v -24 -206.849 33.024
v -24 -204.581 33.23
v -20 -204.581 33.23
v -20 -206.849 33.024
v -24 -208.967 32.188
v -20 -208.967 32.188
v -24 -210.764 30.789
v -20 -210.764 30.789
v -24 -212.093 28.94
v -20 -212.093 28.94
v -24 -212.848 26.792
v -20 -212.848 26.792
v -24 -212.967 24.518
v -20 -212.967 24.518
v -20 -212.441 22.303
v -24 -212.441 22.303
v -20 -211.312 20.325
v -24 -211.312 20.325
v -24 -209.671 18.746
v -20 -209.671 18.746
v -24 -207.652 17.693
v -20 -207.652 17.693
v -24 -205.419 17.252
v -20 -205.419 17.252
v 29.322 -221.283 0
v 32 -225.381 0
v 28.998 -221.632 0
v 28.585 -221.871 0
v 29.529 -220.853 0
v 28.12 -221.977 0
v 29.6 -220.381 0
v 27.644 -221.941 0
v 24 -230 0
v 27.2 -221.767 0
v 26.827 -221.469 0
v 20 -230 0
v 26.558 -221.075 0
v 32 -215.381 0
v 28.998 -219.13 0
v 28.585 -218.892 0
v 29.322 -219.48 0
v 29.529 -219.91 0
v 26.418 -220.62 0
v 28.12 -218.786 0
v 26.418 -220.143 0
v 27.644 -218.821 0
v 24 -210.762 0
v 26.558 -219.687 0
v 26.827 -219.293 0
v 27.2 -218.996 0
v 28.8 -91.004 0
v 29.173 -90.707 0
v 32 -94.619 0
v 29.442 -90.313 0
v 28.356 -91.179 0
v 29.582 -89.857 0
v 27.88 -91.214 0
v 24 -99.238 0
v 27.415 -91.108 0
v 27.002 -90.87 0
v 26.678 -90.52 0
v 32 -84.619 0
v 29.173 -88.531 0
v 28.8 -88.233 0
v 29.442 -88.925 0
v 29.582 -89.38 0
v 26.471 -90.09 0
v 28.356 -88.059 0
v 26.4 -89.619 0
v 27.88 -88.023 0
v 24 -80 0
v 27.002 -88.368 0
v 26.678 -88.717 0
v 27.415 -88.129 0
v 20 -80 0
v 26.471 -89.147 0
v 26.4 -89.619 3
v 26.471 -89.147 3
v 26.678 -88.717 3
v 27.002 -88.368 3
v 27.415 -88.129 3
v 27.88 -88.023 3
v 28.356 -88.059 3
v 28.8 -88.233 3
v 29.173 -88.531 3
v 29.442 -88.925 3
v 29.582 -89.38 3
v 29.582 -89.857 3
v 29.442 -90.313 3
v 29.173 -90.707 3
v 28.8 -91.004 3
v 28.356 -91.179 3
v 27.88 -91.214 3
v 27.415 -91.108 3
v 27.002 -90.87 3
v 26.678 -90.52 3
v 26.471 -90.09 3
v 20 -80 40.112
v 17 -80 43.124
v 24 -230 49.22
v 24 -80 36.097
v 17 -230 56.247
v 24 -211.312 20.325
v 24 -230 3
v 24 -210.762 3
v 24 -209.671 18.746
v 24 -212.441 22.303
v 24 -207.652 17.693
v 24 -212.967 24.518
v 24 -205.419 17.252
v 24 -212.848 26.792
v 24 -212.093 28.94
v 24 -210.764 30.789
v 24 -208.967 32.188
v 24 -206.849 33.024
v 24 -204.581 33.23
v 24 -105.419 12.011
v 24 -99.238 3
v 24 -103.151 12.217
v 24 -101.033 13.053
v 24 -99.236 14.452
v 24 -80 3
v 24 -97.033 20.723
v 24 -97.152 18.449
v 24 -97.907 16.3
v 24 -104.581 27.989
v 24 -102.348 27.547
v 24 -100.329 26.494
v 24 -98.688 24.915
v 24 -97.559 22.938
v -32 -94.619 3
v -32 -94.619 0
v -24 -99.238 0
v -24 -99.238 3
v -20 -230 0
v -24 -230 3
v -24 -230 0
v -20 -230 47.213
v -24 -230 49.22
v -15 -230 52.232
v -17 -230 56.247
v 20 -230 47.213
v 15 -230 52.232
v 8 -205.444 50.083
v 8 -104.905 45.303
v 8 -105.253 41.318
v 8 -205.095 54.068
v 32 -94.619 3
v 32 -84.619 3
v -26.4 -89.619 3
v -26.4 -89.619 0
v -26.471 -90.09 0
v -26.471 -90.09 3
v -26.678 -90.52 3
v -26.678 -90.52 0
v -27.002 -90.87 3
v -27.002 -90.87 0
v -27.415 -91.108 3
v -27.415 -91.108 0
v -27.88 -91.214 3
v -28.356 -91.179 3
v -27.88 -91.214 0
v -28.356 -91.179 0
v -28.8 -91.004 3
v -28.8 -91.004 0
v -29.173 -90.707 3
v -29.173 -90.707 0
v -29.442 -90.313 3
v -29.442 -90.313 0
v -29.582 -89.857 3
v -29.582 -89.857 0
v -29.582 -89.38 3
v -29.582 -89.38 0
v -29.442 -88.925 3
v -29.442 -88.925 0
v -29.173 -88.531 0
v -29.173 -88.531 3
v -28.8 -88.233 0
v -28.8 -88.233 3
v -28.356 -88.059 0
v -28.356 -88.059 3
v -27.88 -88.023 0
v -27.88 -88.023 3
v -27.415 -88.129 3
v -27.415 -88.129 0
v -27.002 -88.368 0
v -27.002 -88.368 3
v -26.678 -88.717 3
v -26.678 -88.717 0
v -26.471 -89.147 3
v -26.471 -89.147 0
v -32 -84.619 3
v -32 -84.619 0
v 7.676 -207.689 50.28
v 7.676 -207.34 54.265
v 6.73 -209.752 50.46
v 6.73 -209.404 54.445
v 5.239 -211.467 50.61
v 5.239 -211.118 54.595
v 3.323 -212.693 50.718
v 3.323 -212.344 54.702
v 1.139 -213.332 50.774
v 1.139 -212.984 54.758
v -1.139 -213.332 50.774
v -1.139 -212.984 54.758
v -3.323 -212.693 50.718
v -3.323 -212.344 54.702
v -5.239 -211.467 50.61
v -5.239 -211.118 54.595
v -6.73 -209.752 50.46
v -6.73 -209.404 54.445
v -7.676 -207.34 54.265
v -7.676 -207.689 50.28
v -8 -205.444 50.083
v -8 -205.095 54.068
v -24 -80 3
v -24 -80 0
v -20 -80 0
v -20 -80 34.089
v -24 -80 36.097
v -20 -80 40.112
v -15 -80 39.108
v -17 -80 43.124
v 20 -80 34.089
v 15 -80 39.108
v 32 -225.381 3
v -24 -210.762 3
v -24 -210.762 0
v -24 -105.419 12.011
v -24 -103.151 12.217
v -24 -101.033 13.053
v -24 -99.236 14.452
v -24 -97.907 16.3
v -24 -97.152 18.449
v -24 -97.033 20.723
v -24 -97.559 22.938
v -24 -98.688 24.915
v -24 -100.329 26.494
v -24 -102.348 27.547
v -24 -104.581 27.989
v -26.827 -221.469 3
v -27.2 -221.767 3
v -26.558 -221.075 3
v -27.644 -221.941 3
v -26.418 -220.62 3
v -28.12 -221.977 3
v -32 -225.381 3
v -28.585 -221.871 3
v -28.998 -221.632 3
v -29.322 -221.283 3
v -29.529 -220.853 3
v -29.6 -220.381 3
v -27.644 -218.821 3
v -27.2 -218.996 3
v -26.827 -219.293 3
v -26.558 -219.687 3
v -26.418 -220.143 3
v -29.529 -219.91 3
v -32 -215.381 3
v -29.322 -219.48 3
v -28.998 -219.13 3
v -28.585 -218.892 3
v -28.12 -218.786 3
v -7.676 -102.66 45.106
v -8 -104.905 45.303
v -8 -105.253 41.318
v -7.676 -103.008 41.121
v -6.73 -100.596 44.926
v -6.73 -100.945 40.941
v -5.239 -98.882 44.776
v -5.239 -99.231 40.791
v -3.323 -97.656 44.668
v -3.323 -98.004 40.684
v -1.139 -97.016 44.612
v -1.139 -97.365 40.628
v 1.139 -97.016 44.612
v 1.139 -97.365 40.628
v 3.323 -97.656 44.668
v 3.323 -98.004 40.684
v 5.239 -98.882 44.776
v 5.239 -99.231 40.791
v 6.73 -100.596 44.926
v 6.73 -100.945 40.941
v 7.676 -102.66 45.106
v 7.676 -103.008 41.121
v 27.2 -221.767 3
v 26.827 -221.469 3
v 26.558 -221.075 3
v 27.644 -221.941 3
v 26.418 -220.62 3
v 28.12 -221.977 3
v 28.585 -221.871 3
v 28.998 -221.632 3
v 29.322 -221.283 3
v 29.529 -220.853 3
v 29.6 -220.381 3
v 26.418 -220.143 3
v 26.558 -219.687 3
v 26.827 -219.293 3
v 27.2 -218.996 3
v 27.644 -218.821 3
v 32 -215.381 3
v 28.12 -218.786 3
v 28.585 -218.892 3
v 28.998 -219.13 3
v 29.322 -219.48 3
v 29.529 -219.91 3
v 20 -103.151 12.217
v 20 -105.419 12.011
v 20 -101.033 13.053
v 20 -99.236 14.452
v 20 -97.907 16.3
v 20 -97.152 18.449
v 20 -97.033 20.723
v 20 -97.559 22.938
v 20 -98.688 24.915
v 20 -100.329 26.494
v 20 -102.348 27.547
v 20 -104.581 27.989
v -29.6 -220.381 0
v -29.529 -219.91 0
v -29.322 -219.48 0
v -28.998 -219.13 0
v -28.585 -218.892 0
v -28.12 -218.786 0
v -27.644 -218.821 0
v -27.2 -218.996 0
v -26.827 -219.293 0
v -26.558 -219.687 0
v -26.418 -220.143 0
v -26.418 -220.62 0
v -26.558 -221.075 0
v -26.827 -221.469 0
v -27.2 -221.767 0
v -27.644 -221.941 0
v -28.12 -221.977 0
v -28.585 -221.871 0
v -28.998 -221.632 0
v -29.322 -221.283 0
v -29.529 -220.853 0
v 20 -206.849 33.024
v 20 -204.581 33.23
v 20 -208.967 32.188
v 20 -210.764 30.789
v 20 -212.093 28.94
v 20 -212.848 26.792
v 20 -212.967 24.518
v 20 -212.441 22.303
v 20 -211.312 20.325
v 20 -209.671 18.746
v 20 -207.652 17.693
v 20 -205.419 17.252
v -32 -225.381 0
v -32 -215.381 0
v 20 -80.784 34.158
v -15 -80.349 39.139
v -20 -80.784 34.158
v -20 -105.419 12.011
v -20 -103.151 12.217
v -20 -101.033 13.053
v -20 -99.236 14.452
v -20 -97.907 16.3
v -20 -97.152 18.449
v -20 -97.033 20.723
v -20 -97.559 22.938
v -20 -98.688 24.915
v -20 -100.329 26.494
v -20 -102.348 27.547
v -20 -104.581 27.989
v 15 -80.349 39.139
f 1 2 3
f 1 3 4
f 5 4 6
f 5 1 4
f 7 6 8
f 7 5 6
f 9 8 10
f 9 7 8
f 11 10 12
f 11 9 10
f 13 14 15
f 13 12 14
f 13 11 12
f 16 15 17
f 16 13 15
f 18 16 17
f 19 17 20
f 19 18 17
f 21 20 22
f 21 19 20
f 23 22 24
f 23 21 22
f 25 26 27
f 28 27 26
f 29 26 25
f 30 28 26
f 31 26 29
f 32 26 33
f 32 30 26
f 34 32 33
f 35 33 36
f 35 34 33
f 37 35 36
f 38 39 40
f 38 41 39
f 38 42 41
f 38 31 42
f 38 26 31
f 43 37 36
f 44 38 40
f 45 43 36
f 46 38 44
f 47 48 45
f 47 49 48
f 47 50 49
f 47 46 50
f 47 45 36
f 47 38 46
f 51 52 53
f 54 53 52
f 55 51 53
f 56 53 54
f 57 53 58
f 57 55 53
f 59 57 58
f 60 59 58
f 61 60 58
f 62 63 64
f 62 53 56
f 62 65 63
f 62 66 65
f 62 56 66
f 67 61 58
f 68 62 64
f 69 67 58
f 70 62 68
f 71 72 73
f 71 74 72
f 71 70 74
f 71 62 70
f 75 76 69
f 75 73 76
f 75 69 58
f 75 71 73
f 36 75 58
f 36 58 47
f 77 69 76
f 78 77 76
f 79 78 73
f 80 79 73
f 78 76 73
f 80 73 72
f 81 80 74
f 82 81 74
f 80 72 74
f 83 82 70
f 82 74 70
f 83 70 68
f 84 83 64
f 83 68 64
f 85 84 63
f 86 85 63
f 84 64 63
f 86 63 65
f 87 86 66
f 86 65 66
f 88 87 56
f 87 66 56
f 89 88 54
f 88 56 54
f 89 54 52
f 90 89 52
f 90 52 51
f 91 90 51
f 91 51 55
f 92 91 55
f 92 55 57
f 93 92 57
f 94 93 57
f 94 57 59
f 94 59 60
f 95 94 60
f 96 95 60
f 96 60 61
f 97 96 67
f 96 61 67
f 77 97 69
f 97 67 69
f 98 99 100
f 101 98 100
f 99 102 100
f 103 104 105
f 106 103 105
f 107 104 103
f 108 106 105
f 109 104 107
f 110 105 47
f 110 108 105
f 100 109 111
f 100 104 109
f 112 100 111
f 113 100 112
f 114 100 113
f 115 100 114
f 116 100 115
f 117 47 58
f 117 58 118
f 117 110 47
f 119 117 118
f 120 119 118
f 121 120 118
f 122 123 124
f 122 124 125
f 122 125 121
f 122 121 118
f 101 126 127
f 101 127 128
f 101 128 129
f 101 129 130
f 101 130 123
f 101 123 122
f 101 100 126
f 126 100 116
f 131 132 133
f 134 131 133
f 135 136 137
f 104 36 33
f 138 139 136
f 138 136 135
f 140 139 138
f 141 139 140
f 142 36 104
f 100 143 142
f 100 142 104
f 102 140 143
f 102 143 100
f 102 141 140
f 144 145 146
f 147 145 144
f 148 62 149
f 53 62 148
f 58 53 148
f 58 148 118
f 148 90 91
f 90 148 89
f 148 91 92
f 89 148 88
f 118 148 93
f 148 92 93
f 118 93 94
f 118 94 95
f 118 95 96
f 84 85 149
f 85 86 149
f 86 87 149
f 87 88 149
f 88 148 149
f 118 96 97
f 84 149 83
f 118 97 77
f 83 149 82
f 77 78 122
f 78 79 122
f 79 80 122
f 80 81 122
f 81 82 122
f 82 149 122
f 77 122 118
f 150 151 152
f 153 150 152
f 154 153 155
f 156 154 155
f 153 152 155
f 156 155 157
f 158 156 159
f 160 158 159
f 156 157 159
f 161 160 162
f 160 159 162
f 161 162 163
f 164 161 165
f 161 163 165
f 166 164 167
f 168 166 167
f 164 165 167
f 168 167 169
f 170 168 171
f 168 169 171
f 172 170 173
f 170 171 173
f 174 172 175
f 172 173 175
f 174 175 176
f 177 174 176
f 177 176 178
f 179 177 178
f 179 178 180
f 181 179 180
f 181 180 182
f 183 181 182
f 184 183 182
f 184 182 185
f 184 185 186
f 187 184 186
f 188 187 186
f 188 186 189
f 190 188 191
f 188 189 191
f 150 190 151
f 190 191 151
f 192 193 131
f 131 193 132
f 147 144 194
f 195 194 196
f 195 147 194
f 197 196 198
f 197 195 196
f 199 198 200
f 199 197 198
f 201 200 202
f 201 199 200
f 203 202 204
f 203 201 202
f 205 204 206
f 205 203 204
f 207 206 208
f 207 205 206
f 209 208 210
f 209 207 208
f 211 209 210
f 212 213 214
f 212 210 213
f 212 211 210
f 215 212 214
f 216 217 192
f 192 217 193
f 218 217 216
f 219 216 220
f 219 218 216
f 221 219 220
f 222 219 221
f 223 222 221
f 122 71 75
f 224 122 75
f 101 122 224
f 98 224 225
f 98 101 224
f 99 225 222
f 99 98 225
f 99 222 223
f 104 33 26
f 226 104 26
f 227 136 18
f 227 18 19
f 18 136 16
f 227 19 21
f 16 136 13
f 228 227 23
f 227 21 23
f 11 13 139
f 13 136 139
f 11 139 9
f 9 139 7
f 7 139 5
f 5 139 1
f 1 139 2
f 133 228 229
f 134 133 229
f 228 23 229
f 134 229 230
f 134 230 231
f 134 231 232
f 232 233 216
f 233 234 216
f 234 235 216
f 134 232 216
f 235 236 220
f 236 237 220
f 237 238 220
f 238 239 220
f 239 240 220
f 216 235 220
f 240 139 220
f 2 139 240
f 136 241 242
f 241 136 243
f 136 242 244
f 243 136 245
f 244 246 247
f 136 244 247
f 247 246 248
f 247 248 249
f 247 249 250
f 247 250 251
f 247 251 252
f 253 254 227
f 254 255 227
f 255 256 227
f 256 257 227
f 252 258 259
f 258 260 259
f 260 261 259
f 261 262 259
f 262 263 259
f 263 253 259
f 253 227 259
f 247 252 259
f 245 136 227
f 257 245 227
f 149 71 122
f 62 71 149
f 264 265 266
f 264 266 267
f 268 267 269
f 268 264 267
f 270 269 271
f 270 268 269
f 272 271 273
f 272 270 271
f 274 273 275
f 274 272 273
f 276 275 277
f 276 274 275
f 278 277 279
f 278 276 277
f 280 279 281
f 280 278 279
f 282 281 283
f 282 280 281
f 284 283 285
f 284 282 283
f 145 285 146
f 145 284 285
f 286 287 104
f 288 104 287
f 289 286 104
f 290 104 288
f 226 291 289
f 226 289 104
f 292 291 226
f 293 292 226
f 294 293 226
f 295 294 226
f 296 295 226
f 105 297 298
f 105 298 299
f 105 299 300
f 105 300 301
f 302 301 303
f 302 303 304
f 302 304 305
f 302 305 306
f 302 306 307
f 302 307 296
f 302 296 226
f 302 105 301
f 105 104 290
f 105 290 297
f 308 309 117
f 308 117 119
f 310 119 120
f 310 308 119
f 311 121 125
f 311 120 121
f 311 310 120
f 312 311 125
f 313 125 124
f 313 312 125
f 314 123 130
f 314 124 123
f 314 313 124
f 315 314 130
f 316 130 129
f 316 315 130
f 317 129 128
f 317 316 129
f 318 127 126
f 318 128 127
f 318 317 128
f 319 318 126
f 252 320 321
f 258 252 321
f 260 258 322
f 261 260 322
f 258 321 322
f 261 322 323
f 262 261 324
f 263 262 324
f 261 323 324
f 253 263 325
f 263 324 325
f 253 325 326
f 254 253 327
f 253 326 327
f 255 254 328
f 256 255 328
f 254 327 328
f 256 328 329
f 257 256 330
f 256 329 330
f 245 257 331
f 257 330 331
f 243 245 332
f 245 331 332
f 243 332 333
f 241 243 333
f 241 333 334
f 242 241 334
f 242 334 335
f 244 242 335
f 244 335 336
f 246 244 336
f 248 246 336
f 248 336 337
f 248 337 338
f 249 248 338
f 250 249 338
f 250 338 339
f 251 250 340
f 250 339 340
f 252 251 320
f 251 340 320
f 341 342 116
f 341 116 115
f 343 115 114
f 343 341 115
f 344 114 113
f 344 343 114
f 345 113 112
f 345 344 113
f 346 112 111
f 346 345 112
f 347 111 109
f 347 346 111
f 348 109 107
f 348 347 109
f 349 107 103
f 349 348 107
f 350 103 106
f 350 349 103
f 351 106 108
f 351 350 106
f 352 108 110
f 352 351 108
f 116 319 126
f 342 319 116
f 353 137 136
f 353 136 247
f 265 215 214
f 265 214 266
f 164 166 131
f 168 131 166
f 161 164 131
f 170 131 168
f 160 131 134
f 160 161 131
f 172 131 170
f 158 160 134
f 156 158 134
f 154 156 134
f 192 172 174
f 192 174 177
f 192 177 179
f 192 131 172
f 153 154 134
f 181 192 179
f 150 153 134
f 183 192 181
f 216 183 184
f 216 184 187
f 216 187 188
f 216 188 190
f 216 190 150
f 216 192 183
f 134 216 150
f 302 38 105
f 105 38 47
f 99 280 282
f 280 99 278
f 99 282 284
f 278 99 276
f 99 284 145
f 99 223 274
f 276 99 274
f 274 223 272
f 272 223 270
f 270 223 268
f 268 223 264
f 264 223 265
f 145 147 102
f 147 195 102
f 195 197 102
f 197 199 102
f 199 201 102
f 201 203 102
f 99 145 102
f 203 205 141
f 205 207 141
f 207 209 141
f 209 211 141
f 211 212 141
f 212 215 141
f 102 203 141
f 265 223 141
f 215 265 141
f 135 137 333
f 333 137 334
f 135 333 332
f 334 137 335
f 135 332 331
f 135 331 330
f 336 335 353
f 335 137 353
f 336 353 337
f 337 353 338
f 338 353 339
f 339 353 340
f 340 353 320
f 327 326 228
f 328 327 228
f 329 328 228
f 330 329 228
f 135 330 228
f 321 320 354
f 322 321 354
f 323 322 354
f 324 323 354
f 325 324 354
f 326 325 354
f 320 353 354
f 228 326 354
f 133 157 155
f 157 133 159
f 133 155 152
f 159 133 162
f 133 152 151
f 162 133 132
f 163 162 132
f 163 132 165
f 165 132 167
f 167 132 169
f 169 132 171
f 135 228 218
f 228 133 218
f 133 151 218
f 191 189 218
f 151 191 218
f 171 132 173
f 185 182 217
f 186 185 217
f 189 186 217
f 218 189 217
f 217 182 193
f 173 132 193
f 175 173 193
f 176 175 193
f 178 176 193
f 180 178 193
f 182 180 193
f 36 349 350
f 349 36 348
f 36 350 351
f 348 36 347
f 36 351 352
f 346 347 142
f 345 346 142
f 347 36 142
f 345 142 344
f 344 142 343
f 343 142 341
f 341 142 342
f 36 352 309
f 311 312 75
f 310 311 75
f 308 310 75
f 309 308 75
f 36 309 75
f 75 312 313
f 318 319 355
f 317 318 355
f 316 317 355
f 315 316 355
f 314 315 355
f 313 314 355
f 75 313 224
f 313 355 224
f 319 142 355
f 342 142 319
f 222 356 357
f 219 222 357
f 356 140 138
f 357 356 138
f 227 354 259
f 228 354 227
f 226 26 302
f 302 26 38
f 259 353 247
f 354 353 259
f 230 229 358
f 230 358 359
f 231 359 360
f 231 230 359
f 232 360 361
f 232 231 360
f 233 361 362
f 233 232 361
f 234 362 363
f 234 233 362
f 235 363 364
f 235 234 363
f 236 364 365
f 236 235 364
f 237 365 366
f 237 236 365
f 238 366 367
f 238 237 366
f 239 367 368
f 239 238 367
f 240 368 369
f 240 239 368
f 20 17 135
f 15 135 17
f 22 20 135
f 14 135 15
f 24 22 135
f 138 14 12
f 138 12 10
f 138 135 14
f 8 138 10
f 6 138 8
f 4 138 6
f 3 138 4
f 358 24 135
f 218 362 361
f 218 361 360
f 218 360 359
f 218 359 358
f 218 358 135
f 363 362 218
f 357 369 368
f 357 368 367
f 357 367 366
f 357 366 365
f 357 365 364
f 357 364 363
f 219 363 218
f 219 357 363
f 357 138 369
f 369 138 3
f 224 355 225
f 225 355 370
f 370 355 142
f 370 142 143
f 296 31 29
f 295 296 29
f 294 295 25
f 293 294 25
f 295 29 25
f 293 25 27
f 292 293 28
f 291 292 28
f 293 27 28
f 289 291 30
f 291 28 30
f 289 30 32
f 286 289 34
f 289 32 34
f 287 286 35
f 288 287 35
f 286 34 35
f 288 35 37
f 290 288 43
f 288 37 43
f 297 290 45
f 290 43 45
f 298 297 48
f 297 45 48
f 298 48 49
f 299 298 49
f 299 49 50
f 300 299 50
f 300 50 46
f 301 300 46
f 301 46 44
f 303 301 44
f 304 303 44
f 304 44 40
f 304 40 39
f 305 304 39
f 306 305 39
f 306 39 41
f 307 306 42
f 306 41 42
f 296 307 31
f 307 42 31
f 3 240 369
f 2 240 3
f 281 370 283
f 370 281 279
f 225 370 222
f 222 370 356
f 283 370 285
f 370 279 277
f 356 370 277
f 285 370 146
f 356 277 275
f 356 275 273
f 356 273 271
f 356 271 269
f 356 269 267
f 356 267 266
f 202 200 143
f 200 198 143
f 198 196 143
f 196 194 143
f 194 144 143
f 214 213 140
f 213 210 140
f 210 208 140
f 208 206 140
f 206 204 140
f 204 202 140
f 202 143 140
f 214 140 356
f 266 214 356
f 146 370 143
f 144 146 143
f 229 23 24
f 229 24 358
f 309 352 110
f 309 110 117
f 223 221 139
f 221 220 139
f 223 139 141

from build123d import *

# Parameters (mm, degrees)
BOSS_EXTRUDE1_START   = -24
BOSS_EXTRUDE1_DEPTH   = 4
BOSS_EXTRUDE1_START_2 = 20
BOSS_EXTRUDE1_2_DEPTH = 4
SKETCH3_W             = 48
SKETCH3_H             = 150.572975632
BOSS_EXTRUDE2_DEPTH   = 4
SKETCH4_W             = 87.955919885
SKETCH4_H             = 41.238898543
CUT_EXTRUDE1_DEPTH    = 10
CHAMFER1_SIZE         = 5
CHAMFER2_SIZE         = 7
CUT_EXTRUDE2_DEPTH    = 100
BOSS_EXTRUDE3_REACH   = 158.663
SKETCH7_R             = 1.6
BOSS_EXTRUDE4_DEPTH   = 3
CUT_EXTRUDE3_DEPTH    = 13


# Read off the part's stored shape, not the designer's step: Boss-Extrude1
with BuildPart() as part:
    # Boss-Extrude1 outline → Boss-Extrude1 (new body)
    with BuildSketch(Plane.YZ.offset(BOSS_EXTRUDE1_START)):
        Polygon((-230, 56.247033646), (-230, 0), (-80, 0), (-80, 43.123734117), align=None)
    extrude(amount=BOSS_EXTRUDE1_DEPTH)



with BuildPart() as body_2:
    # Boss-Extrude1 2 outline → Boss-Extrude1 2 (new body)
    with BuildSketch(Plane.YZ.offset(BOSS_EXTRUDE1_START_2)):
        Polygon((-230, 56.247033646), (-230, 0), (-80, 0), (-80, 43.123734117), align=None)
    extrude(amount=BOSS_EXTRUDE1_2_DEPTH)


with BuildPart() as part_1:
    add(part.part)

    add(body_2.part)  # Boss-Extrude2 merges body 2
    # Sketch3 → Boss-Extrude2 (add)
    with BuildSketch(Plane(origin=(0, 3.136489042, 35.850233801), x_dir=(1, 0, 0), z_dir=(-5.546132053355945e-15, 0.08715574274765837, 0.9961946980917457))):
        with Locations((0, -158.74054474)):
            Rectangle(SKETCH3_W, SKETCH3_H)
    extrude(amount=-BOSS_EXTRUDE2_DEPTH)

    # Sketch4 → Cut-Extrude1 (cut)
    with BuildSketch(Plane.XZ.offset(230)):
        with Locations((0.013546112, 51.627258861)):
            Rectangle(SKETCH4_W, SKETCH4_H)
    extrude(amount=CUT_EXTRUDE1_DEPTH, mode=Mode.SUBTRACT)

    # Chamfer1
    chamfer1_edges = [part_1.edges().sort_by_distance(p)[0] for p in [
        (-20, -155.174311485, 45.685354811),
        (20, -155.174311485, 45.685354811),
    ]]
    chamfer(chamfer1_edges, length=CHAMFER1_SIZE)

    # Chamfer2
    # the kernel refuses this chamfer: 7 mm, written as the material it takes off along each edge
    with BuildSketch(Plane(origin=(24, -62.066721296, 41.55477553), x_dir=(0.027495876610592048, -0.08712279063597585, -0.9958180537232768), z_dir=(0, -0.9961946980916814, 0.0871557427483924)), Plane(origin=(-24, -62.066721296, 41.55477553), x_dir=(0.9996219169112968, 0.0023964235485137053, 0.027391246498848068), z_dir=(0, -0.9961946980916814, 0.0871557427483924))) as chamfer2_piece_1:
        Polygon((CHAMFER2_SIZE * 0.999621916911, -CHAMFER2_SIZE * 0.0274958766106), (-CHAMFER2_SIZE * 0.0274958766106, -CHAMFER2_SIZE * 0.999621916911), (0, 0), align=None)
    extrude(amount=186.576537463, mode=Mode.SUBTRACT)

    # Sketch5 → Cut-Extrude2 (cut)
    with BuildSketch(Plane.ZY.offset(24)):
        with BuildLine():
            Line((27.989036278, -104.58131235), (33.229814206, -204.58131235))
            ThreePointArc((33.229814206, -204.58131235), (25.659465578, -212.989036278), (17.25174165, -205.41868765))
            Line((17.25174165, -205.41868765), (12.010963722, -105.41868765))
            ThreePointArc((12.010963722, -105.41868765), (19.58131235, -97.010963722), (27.989036278, -104.58131235))
        make_face()
    extrude(amount=-CUT_EXTRUDE2_DEPTH, mode=Mode.SUBTRACT)

    # Boss-Extrude3: up to this face of the body (flat: up to its plane)
    boss_extrude3_end = Plane(part_1.part.faces().sort_by_distance((21.96487497, -80, 19.069947066))[0])
    # Sketch6 → Boss-Extrude3 (add, up to the picked face)
    with BuildSketch(Plane(origin=(0, -83.136489042, 7.273500317), x_dir=(1, 0, 0), z_dir=(0, 0.9961946980917457, -0.0871557427476584)), mode=Mode.PRIVATE) as boss_extrude3_sk1:
        Polygon((20, -32.98717587), (20, -26.98717587), (15, -31.98717587), (-15, -31.98717587), (-20, -26.98717587), (-20, -32.98717587), (-17, -35.98717587), (17, -35.98717587), align=None)
    boss_extrude3_tool1 = split(extrude(boss_extrude3_sk1.sketch, amount=BOSS_EXTRUDE3_REACH, mode=Mode.PRIVATE), bisect_by=boss_extrude3_end, keep=Keep.BOTH, mode=Mode.PRIVATE)
    add(boss_extrude3_tool1.solids().sort_by(Axis((0, -80.224162, 40.561552), (0, 0.9961946980917457, -0.0871557427476584)))[0])

    # Sketch7 → Boss-Extrude4 (add)
    # profile 1 of 4: a face of its own
    with BuildSketch(Plane(origin=(0, 0, 0), x_dir=(-1, 0, 0), z_dir=(0, 0, -1))):
        Polygon((-24, -80), (-32, -84.618802154), (-32, -94.618802154), (-24, -99.237604307), align=None)
        with Locations((-28, -89.618802154)):
            Circle(SKETCH7_R, mode=Mode.SUBTRACT)
    # profile 2 of 4: a face of its own
    with BuildSketch(Plane(origin=(0, 0, 0), x_dir=(-1, 0, 0), z_dir=(0, 0, -1))):
        Polygon((-24, -210.762395693), (-24, -230), (-32, -225.381197846), (-32, -215.381197846), align=None)
        with Locations(Location((-28, -220.381197846, 0), (0, 0, 180))):
            Circle(SKETCH7_R, mode=Mode.SUBTRACT)
    # profile 3 of 4: a face of its own
    with BuildSketch(Plane(origin=(0, 0, 0), x_dir=(-1, 0, 0), z_dir=(0, 0, -1))):
        Polygon((24, -230), (32, -225.381197846), (32, -215.381197846), (24, -210.762395693), align=None)
        with Locations((28, -220.381197846)):
            Circle(SKETCH7_R, mode=Mode.SUBTRACT)
    # profile 4 of 4: a face of its own
    with BuildSketch(Plane(origin=(0, 0, 0), x_dir=(-1, 0, 0), z_dir=(0, 0, -1))):
        Polygon((24, -99.237604307), (24, -80), (32, -84.618802154), (32, -94.618802154), align=None)
        with Locations(Location((28, -89.618802154, 0), (0, 0, 180))):
            Circle(SKETCH7_R, mode=Mode.SUBTRACT)
    extrude(amount=-BOSS_EXTRUDE4_DEPTH)

    # Sketch8 → Cut-Extrude3 (cut)
    with BuildSketch(Plane(origin=(0, 3.136489042, 35.850233801), x_dir=(1, 0, 0), z_dir=(-5.546132053355945e-15, 0.08715574274765837, 0.9961946980917457))):
        with BuildLine():
            Line((8, -108.454056924), (8, -209.027032556))
            ThreePointArc((8, -209.027032556), (0, -217.027032556), (-8, -209.027032556))
            Line((-8, -209.027032556), (-8, -108.454056924))
            ThreePointArc((-8, -108.454056924), (0, -100.454056924), (8, -108.454056924))
        make_face()
    extrude(amount=-CUT_EXTRUDE3_DEPTH, mode=Mode.SUBTRACT)


solid = part_1.part
